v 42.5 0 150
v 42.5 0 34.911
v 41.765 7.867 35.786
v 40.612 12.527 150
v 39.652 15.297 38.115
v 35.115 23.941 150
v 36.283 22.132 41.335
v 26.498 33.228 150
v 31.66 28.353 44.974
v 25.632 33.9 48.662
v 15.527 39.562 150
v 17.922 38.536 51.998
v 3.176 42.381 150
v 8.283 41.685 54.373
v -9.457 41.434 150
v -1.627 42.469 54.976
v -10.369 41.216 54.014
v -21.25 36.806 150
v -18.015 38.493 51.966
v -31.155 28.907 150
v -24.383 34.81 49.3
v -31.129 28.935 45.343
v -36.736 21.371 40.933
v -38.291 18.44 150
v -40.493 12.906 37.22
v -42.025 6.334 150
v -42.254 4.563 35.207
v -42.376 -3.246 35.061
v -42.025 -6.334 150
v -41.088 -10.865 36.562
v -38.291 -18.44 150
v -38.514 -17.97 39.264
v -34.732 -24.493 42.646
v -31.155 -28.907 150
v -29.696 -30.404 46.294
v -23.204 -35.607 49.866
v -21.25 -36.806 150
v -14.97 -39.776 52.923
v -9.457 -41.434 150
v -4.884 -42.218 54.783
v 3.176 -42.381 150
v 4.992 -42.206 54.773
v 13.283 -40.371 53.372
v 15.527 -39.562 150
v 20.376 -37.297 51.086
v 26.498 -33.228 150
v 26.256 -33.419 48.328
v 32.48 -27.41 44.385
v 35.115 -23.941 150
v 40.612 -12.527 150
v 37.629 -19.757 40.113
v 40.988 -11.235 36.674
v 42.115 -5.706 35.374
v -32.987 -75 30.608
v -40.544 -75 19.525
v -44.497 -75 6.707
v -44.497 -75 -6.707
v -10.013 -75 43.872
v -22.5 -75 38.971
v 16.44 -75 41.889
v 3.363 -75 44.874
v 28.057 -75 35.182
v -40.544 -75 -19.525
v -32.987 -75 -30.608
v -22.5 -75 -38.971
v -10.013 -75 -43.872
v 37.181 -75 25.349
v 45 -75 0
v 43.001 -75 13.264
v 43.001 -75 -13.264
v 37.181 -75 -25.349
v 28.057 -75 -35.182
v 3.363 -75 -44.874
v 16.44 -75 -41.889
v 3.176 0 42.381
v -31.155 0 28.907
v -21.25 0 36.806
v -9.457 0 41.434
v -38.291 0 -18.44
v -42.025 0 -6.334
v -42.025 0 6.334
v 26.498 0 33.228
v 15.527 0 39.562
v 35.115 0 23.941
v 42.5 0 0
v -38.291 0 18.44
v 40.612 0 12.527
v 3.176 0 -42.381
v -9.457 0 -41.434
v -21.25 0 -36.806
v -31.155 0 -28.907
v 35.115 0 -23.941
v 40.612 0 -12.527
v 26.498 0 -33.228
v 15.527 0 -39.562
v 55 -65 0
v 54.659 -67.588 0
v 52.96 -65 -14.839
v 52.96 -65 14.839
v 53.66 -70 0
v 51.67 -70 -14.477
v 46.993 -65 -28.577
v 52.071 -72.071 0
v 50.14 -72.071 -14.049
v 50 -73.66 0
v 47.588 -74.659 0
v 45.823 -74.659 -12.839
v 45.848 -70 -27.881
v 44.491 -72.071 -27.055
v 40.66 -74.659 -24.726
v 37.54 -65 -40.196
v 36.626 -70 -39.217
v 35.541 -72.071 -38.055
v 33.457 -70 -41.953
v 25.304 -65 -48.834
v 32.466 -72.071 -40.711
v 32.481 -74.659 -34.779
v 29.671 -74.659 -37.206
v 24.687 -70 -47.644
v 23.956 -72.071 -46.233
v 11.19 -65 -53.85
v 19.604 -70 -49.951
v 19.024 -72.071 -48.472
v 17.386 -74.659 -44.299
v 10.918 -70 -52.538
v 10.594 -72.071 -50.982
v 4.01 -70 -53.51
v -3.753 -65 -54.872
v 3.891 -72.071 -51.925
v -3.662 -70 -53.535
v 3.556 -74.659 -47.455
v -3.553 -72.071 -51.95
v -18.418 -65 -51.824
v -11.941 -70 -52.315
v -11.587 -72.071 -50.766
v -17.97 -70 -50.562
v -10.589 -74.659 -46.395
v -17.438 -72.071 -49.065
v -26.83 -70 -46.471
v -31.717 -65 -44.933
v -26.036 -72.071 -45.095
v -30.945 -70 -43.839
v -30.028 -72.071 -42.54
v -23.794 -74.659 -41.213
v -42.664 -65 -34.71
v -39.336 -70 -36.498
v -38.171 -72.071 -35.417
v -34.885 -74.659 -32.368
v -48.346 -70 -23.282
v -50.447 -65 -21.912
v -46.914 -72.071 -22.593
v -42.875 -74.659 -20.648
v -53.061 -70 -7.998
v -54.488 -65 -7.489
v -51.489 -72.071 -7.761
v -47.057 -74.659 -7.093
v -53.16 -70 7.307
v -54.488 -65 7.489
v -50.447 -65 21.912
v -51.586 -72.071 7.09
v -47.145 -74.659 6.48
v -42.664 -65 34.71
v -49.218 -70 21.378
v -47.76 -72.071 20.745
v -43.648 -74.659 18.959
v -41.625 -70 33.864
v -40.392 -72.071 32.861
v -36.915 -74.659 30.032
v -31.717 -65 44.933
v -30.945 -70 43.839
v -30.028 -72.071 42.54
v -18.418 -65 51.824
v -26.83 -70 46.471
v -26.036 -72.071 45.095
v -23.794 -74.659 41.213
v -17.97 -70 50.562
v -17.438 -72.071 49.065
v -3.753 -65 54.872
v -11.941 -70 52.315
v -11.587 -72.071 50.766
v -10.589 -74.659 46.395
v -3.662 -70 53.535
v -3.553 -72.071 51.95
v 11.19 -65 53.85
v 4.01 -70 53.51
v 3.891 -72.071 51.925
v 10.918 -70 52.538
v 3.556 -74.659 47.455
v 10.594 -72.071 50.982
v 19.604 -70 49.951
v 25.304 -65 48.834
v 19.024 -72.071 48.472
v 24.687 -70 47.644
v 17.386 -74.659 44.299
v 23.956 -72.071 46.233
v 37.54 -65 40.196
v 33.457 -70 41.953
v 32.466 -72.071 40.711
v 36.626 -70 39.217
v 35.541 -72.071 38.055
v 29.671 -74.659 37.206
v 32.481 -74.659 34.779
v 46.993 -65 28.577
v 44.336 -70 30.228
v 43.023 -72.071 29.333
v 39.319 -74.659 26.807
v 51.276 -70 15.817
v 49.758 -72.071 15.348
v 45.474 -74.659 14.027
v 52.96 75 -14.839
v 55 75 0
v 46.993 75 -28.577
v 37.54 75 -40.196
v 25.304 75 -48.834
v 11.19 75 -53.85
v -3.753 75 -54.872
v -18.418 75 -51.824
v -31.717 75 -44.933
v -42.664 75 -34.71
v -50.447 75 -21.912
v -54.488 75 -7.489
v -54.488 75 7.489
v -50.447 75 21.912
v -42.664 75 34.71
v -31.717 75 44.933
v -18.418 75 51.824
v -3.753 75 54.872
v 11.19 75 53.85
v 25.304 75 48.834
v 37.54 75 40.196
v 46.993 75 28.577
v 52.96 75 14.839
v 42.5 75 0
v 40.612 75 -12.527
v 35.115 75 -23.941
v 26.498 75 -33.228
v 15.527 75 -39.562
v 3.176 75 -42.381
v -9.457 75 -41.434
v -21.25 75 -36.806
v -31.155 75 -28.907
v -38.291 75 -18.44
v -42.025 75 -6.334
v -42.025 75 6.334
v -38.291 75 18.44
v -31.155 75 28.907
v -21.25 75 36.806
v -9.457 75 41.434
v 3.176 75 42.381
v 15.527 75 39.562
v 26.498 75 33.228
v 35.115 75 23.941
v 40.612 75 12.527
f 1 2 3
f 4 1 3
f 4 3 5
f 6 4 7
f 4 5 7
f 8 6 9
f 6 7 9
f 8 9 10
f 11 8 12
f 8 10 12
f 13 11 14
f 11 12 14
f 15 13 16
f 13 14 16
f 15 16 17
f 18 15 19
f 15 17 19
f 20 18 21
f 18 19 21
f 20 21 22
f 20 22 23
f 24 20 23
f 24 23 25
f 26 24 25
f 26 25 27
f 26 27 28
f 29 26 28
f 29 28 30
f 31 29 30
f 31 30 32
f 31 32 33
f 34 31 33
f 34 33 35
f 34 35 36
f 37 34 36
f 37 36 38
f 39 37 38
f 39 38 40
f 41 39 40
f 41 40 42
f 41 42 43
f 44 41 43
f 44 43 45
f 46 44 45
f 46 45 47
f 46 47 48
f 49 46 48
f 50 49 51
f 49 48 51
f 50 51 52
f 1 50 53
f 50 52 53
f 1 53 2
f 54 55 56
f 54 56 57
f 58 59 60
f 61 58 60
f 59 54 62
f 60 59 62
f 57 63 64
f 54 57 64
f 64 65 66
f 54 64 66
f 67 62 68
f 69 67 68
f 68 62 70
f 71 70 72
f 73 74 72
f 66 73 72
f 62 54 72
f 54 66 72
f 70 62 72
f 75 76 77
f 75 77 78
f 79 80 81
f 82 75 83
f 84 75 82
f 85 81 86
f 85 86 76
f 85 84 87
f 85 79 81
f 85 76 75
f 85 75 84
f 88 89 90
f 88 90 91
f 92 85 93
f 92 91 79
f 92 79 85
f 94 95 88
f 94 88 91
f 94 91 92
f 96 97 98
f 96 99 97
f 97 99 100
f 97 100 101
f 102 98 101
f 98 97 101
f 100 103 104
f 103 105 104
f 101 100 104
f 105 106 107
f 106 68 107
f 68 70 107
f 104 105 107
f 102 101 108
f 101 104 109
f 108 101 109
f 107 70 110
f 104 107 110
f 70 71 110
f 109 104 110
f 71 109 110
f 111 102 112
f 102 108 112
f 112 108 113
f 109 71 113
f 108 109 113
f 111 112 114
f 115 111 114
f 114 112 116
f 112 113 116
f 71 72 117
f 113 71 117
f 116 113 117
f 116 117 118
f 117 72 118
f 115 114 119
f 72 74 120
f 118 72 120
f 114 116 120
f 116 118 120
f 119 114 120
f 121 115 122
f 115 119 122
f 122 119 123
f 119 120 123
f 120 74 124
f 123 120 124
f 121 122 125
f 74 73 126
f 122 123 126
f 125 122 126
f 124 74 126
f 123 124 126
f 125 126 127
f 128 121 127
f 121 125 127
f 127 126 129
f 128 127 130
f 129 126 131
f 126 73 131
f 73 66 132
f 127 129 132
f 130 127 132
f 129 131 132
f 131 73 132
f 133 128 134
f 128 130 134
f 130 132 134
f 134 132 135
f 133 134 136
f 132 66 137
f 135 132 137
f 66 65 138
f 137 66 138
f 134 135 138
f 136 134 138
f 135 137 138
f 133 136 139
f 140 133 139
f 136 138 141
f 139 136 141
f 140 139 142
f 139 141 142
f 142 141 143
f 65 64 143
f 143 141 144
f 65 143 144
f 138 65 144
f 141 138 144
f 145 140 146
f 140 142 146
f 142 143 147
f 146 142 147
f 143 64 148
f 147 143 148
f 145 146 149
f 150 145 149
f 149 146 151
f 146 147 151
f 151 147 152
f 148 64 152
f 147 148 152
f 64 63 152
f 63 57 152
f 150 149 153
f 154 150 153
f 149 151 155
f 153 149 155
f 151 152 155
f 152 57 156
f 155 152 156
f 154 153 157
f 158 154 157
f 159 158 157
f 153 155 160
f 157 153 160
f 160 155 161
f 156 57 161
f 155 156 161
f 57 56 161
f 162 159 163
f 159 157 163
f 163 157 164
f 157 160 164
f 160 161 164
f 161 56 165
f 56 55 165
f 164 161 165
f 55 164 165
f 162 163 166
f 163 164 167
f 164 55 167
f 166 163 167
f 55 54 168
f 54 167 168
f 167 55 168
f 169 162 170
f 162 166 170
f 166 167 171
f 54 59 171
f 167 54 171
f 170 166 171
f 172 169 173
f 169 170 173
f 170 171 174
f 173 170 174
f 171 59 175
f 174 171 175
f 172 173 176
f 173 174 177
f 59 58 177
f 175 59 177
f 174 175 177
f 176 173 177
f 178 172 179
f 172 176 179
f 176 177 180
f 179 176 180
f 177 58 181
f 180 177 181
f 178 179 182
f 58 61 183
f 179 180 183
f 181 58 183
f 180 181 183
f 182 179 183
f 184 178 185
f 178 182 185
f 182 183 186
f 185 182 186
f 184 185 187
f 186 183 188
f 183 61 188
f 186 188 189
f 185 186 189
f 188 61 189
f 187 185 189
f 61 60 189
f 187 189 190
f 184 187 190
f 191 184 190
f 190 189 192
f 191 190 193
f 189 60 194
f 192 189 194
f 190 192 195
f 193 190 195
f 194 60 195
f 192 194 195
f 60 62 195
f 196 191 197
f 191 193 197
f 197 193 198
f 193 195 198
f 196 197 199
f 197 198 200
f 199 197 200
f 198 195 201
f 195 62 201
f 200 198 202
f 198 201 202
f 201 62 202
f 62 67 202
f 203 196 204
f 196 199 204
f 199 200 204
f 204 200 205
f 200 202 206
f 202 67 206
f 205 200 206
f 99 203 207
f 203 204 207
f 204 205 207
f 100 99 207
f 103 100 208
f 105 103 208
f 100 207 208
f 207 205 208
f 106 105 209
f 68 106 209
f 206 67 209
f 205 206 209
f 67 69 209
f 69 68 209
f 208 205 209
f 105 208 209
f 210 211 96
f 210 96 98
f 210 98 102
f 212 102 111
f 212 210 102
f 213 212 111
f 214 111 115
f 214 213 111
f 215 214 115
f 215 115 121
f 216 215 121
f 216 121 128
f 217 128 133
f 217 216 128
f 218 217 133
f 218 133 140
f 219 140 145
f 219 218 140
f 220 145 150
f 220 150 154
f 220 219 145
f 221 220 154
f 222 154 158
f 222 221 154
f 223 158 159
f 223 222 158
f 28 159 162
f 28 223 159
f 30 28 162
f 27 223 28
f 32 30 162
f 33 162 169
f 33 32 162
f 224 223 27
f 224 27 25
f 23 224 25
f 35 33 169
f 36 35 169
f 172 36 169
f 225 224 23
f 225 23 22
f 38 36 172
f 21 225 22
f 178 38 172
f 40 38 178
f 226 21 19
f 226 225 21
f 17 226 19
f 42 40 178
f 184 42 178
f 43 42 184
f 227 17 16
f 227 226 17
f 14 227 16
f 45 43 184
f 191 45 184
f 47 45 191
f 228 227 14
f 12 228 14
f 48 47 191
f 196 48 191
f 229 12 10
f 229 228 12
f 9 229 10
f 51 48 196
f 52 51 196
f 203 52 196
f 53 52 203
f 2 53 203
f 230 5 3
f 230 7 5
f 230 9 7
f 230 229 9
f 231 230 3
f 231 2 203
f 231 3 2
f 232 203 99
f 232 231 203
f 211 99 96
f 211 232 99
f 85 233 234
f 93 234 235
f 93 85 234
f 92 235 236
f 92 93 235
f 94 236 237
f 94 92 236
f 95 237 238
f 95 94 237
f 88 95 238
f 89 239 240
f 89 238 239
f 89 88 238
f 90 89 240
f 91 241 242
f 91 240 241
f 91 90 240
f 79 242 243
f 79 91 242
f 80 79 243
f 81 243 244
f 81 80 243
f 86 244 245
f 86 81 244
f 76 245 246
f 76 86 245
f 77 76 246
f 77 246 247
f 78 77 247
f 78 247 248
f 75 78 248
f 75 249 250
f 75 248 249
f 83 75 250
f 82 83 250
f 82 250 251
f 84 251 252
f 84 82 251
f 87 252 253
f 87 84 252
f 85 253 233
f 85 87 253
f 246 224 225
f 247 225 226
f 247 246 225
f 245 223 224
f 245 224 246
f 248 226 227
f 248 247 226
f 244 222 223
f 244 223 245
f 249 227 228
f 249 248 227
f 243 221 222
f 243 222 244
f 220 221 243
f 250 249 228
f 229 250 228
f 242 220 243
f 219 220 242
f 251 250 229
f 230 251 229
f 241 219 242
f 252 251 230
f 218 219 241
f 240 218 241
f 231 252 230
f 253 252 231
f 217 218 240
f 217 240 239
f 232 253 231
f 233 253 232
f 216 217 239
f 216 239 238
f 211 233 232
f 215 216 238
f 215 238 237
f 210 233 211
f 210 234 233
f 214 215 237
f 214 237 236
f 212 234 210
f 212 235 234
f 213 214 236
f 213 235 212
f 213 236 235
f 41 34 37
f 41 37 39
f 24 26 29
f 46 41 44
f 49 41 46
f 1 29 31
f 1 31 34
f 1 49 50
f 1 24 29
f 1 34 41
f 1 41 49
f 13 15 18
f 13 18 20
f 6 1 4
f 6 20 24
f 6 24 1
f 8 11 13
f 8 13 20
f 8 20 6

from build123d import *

# Parameters (mm, degrees)
SKETCH1_R           = 55
BOSS_EXTRUDE1_DEPTH = 75
SKETCH2_R           = 42.5
BOSS_EXTRUDE2_DEPTH = 150
FILLET2_R           = 10
SKETCH3_R           = 42.5
CUT_EXTRUDE1_DEPTH  = 110


with BuildPart() as part:
    # Sketch1 → Boss-Extrude1 (new body, symmetric)
    with BuildSketch(Plane(origin=(0, 0, 0), x_dir=(1, 0, 0), z_dir=(0, 1, 0))):
        Circle(SKETCH1_R)
    extrude(amount=BOSS_EXTRUDE1_DEPTH, both=True)

    # Sketch2 → Boss-Extrude2 (add)
    with BuildSketch(Plane.XY):
        Circle(SKETCH2_R)
    extrude(amount=BOSS_EXTRUDE2_DEPTH)

    # Fillet2
    fillet2_edges = [part.edges().sort_by_distance(p)[0] for p in [
        (-55, -75, 0),
    ]]
    fillet(fillet2_edges, radius=FILLET2_R)

    # Sketch3 → Cut-Extrude1 (cut)
    with BuildSketch(Plane(origin=(0, 0, 0), x_dir=(1, 0, 0), z_dir=(0, 1, 0))):
        Circle(SKETCH3_R)
    extrude(amount=CUT_EXTRUDE1_DEPTH, mode=Mode.SUBTRACT)


solid = part.part
